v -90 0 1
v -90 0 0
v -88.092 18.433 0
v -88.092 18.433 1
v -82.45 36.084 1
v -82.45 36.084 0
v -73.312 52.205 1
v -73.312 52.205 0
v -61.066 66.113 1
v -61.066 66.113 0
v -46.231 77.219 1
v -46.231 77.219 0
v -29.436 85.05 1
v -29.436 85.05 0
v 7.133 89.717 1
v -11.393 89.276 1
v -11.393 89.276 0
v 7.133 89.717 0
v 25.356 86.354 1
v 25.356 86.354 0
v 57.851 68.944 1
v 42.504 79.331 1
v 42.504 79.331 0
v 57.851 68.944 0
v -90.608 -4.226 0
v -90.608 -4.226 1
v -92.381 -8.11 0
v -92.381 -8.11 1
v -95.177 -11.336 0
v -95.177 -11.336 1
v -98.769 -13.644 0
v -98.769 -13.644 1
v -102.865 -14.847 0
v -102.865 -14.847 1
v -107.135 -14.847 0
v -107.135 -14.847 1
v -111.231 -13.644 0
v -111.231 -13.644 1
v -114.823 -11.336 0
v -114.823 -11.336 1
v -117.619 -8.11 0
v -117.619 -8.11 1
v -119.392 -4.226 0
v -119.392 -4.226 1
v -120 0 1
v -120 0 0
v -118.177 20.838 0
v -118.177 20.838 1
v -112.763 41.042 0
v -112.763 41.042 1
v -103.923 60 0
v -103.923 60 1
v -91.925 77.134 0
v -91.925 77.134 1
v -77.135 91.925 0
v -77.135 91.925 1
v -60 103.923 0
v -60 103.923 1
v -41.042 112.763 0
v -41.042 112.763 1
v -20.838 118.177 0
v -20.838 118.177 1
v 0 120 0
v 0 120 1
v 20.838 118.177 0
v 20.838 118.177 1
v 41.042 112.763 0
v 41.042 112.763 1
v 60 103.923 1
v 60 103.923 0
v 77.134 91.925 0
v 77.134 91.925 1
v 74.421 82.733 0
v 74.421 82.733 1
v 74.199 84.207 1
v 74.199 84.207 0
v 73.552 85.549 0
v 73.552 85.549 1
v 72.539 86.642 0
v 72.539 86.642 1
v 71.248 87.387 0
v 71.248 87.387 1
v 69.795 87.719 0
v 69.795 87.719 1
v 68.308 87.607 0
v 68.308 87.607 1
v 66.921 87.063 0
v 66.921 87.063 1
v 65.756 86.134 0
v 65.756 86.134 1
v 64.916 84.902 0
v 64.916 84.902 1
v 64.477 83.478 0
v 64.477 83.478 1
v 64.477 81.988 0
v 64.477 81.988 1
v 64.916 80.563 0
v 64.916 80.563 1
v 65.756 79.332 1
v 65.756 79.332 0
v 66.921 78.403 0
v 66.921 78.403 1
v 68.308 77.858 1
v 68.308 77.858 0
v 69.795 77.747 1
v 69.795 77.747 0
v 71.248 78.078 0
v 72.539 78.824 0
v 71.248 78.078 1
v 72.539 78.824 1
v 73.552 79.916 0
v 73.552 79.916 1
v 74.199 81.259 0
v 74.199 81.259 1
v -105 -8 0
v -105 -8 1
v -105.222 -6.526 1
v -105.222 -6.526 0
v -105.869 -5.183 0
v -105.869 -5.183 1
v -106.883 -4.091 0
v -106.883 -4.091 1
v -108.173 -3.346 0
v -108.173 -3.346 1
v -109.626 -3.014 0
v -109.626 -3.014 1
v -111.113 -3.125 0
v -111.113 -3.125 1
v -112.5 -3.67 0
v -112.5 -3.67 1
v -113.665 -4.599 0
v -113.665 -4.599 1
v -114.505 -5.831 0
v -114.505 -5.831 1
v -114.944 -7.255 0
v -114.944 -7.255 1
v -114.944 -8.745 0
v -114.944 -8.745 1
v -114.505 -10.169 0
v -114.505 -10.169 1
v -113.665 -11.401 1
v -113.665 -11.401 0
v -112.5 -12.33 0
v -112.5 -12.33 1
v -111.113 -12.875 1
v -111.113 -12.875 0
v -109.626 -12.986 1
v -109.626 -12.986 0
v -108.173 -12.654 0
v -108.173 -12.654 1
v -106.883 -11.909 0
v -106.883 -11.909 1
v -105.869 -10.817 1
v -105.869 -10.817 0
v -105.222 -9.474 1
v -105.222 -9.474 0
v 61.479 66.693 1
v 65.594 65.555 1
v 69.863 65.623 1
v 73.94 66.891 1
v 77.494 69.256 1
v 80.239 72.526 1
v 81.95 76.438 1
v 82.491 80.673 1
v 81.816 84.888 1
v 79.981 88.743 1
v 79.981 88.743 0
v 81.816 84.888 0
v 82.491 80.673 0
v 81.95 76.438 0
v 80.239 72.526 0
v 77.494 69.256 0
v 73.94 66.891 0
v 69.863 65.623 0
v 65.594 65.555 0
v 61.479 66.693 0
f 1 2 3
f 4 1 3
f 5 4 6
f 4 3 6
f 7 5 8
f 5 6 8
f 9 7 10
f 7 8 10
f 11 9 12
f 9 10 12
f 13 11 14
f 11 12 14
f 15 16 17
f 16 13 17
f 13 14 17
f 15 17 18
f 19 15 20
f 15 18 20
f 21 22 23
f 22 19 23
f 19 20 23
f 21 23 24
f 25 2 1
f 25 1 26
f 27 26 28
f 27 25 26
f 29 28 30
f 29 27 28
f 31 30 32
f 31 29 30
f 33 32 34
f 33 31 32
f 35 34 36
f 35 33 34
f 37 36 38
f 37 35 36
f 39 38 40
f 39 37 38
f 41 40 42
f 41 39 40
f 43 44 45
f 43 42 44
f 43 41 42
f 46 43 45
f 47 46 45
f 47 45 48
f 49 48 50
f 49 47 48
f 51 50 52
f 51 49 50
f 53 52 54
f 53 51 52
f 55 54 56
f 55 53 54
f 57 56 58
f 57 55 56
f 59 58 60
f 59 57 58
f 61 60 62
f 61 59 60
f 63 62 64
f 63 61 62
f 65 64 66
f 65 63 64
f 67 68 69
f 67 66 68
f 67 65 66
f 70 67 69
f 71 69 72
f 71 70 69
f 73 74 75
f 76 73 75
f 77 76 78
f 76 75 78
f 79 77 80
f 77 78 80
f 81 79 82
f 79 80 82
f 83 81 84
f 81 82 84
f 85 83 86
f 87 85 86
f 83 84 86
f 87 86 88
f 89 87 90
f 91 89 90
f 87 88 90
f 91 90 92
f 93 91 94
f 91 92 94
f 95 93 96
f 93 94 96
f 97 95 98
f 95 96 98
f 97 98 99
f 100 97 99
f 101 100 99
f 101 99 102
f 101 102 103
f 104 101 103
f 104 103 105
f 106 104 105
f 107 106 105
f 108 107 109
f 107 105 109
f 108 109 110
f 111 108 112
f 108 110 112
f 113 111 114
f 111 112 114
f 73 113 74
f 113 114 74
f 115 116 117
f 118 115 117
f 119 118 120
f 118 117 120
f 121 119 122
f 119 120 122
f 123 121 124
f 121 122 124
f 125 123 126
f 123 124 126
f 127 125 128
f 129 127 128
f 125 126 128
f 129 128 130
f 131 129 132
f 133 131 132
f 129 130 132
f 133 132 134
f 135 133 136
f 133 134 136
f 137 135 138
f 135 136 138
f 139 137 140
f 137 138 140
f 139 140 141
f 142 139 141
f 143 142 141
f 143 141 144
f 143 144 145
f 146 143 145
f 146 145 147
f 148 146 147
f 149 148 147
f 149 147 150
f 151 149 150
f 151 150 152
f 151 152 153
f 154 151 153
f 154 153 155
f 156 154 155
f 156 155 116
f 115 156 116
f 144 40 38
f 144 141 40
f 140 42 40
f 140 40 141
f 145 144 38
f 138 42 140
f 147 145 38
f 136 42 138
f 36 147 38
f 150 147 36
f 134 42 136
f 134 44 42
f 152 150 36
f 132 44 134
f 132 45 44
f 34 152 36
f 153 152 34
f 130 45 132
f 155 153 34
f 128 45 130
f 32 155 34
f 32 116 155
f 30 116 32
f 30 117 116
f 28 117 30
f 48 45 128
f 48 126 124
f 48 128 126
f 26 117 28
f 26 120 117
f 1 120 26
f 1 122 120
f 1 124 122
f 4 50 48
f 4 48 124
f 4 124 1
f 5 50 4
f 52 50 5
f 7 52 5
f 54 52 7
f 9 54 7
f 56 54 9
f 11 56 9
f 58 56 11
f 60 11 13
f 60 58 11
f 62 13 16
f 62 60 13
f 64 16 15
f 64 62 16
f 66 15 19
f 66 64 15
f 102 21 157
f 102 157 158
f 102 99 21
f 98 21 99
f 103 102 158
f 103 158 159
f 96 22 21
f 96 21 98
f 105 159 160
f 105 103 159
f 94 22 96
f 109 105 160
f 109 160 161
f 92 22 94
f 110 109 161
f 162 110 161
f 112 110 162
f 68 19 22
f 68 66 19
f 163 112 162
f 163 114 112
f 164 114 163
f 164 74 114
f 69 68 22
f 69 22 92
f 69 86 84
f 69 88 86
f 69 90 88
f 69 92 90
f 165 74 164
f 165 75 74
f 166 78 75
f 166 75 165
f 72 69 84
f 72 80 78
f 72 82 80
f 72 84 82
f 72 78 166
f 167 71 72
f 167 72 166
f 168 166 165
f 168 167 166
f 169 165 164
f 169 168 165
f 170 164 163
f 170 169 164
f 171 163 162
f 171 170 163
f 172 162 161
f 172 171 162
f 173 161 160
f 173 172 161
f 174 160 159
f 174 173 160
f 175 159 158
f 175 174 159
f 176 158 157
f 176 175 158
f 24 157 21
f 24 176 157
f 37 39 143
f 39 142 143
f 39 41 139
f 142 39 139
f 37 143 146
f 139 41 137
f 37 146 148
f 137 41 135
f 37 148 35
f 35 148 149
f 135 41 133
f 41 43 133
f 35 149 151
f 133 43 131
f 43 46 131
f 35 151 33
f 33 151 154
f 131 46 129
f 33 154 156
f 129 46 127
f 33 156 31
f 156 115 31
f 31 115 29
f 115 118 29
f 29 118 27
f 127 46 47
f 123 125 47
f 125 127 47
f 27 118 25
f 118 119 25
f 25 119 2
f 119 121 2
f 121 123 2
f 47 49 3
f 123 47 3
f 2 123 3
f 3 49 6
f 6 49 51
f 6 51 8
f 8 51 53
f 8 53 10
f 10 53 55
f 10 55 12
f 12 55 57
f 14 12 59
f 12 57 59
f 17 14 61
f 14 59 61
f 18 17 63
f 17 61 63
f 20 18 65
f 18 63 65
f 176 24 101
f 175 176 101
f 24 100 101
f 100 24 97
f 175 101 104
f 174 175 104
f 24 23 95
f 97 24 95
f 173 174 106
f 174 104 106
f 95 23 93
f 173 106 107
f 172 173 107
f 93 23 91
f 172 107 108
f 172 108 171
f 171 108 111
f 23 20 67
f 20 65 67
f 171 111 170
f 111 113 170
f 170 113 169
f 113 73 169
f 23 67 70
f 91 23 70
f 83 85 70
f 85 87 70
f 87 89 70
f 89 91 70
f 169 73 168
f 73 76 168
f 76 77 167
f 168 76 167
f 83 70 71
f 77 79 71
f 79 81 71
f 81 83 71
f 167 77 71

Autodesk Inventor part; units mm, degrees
ref_plane "YZ Plane" through (0, 0, 0) normal (1, 0, 0) x (0, 1, 0)
ref_plane "XZ Plane" through (0, 0, 0) normal (0, 1, 0) x (-1, 0, 0)
ref_plane "XY Plane" through (0, 0, 0) normal (0, 0, 1) x (1, 0, 0)
sketch "Sketch1" plane through (0, 0, 0) normal (0, 0, 1) x (1, 0, 0)
  arc A0 (77.1345, 91.9253) -> (-120, 0) centre (0, 0) ccw
  arc A1 (57.8509, 68.944) -> (-90, 0) centre (0, 0) ccw
  line L0 (-120, 0) -> (-90, 0) construction
  line L1 (0, 0) -> (77.1345, 91.9253) construction
  line L2 (57.8509, 68.944) -> (77.1345, 91.9253) construction
  arc A2 (-120, 0) -> (-90, 0) centre (-105, 0) ccw
  arc A3 (57.8509, 68.944) -> (77.1345, 91.9253) centre (67.4927, 80.4347) ccw
  dimension "d0" = 240
  dimension "d1" = 30
  dimension "d2" = 130
extrude "Extrusion2" add sketch "Sketch1" along normal blind 1
sketch "Sketch2" plane through (0, 0, 1) normal (0, 0, 1) x (1, 0, 0)
  arc A0 (77.1345, 91.9253) -> (-120, 0) centre (0, 0) ccw projected
  arc A1 (-120, 0) -> (-90, 0) centre (-105, 0) ccw projected
  circle A2 centre (-110, -8) radius 5
  arc A3 (57.8509, 68.944) -> (-90, 0) centre (0, 0) ccw projected
  arc A4 (57.8509, 68.944) -> (77.1345, 91.9253) centre (67.4927, 80.4347) ccw projected
  line L0 (57.8509, 68.944) -> (77.1345, 91.9253) construction
  circle A5 centre (69.4211, 82.7328) radius 5
  line L1 (-120, 0) -> (-90, 0) construction
  line L2 (-120, 0) -> (-120, 14.4317) construction
  line L3 (77.1345, 91.9253) -> (63.1812, 103.6336) construction
  dimension "d10" = 10
  dimension "d12" = 10
  dimension "d20" = 10
  dimension "d21" = 8
  dimension "d22" = 90
  dimension "d23" = 12
  dimension "d24" = 0
  dimension "d25" = 82.7328
  dimension "d26" = 189.4211
extrude "Extrusion3" cut sketch "Sketch2" against normal through all contours A2 | A5
sketch "Sketch3" plane through (0, 0, 1) normal (0, 0, 1) x (1, 0, 0)
  arc A0 (-120, 0) -> (-90, 0) centre (-105, 0) ccw projected
  line L0 (-120, 0) -> (-90, 0) construction
  line L1 (-120, 0) -> (-109.6077, -6)
  line L2 (-109.6077, -6) -> (-91.2523, -6)
  arc A1 (-120, 0) -> (-90, 0) centre (-105, 0) ccw
  point P0 (0, 0)
  dimension "d16" = 30
  dimension "d17" = 6
extrude "Extrusion4" [suppressed]
equation "\"d0\" = diametro_max"
equation "\"d1\" = ancho_disco"
equation "\"d2\" = angulo_alabe"
equation "\"d10\" = diametro_pin"
equation "\"d12\" = d10"
equation "\"d20\" = desfase_a_pin_inferior"
equation "\"d21\" = desfase_b_pin_inferior"
equation "\"d23\" = desfase_a_pin_superior"
equation "\"angulo_alabe\" = 130deg"
equation "\"ancho_disco\" = 30"
equation "\"diametro_max\" = 240"
equation "\"diametro_tubo\" = 232"
equation "\"desfase_pin_superior\" = 12"
equation "\"desfase_b_pin_inferior\" = 8"
equation "\"desfase_a_pin_inferior\" = 10"
equation "\"desfase_b_pin_superior\" = 0"
equation "\"desfase_a_pin_superior\" = 12"
equation "\"diametro_pin\" = 10"
equation "\"diametro_max_soporte\" = 248"
properties part number "alabes"
